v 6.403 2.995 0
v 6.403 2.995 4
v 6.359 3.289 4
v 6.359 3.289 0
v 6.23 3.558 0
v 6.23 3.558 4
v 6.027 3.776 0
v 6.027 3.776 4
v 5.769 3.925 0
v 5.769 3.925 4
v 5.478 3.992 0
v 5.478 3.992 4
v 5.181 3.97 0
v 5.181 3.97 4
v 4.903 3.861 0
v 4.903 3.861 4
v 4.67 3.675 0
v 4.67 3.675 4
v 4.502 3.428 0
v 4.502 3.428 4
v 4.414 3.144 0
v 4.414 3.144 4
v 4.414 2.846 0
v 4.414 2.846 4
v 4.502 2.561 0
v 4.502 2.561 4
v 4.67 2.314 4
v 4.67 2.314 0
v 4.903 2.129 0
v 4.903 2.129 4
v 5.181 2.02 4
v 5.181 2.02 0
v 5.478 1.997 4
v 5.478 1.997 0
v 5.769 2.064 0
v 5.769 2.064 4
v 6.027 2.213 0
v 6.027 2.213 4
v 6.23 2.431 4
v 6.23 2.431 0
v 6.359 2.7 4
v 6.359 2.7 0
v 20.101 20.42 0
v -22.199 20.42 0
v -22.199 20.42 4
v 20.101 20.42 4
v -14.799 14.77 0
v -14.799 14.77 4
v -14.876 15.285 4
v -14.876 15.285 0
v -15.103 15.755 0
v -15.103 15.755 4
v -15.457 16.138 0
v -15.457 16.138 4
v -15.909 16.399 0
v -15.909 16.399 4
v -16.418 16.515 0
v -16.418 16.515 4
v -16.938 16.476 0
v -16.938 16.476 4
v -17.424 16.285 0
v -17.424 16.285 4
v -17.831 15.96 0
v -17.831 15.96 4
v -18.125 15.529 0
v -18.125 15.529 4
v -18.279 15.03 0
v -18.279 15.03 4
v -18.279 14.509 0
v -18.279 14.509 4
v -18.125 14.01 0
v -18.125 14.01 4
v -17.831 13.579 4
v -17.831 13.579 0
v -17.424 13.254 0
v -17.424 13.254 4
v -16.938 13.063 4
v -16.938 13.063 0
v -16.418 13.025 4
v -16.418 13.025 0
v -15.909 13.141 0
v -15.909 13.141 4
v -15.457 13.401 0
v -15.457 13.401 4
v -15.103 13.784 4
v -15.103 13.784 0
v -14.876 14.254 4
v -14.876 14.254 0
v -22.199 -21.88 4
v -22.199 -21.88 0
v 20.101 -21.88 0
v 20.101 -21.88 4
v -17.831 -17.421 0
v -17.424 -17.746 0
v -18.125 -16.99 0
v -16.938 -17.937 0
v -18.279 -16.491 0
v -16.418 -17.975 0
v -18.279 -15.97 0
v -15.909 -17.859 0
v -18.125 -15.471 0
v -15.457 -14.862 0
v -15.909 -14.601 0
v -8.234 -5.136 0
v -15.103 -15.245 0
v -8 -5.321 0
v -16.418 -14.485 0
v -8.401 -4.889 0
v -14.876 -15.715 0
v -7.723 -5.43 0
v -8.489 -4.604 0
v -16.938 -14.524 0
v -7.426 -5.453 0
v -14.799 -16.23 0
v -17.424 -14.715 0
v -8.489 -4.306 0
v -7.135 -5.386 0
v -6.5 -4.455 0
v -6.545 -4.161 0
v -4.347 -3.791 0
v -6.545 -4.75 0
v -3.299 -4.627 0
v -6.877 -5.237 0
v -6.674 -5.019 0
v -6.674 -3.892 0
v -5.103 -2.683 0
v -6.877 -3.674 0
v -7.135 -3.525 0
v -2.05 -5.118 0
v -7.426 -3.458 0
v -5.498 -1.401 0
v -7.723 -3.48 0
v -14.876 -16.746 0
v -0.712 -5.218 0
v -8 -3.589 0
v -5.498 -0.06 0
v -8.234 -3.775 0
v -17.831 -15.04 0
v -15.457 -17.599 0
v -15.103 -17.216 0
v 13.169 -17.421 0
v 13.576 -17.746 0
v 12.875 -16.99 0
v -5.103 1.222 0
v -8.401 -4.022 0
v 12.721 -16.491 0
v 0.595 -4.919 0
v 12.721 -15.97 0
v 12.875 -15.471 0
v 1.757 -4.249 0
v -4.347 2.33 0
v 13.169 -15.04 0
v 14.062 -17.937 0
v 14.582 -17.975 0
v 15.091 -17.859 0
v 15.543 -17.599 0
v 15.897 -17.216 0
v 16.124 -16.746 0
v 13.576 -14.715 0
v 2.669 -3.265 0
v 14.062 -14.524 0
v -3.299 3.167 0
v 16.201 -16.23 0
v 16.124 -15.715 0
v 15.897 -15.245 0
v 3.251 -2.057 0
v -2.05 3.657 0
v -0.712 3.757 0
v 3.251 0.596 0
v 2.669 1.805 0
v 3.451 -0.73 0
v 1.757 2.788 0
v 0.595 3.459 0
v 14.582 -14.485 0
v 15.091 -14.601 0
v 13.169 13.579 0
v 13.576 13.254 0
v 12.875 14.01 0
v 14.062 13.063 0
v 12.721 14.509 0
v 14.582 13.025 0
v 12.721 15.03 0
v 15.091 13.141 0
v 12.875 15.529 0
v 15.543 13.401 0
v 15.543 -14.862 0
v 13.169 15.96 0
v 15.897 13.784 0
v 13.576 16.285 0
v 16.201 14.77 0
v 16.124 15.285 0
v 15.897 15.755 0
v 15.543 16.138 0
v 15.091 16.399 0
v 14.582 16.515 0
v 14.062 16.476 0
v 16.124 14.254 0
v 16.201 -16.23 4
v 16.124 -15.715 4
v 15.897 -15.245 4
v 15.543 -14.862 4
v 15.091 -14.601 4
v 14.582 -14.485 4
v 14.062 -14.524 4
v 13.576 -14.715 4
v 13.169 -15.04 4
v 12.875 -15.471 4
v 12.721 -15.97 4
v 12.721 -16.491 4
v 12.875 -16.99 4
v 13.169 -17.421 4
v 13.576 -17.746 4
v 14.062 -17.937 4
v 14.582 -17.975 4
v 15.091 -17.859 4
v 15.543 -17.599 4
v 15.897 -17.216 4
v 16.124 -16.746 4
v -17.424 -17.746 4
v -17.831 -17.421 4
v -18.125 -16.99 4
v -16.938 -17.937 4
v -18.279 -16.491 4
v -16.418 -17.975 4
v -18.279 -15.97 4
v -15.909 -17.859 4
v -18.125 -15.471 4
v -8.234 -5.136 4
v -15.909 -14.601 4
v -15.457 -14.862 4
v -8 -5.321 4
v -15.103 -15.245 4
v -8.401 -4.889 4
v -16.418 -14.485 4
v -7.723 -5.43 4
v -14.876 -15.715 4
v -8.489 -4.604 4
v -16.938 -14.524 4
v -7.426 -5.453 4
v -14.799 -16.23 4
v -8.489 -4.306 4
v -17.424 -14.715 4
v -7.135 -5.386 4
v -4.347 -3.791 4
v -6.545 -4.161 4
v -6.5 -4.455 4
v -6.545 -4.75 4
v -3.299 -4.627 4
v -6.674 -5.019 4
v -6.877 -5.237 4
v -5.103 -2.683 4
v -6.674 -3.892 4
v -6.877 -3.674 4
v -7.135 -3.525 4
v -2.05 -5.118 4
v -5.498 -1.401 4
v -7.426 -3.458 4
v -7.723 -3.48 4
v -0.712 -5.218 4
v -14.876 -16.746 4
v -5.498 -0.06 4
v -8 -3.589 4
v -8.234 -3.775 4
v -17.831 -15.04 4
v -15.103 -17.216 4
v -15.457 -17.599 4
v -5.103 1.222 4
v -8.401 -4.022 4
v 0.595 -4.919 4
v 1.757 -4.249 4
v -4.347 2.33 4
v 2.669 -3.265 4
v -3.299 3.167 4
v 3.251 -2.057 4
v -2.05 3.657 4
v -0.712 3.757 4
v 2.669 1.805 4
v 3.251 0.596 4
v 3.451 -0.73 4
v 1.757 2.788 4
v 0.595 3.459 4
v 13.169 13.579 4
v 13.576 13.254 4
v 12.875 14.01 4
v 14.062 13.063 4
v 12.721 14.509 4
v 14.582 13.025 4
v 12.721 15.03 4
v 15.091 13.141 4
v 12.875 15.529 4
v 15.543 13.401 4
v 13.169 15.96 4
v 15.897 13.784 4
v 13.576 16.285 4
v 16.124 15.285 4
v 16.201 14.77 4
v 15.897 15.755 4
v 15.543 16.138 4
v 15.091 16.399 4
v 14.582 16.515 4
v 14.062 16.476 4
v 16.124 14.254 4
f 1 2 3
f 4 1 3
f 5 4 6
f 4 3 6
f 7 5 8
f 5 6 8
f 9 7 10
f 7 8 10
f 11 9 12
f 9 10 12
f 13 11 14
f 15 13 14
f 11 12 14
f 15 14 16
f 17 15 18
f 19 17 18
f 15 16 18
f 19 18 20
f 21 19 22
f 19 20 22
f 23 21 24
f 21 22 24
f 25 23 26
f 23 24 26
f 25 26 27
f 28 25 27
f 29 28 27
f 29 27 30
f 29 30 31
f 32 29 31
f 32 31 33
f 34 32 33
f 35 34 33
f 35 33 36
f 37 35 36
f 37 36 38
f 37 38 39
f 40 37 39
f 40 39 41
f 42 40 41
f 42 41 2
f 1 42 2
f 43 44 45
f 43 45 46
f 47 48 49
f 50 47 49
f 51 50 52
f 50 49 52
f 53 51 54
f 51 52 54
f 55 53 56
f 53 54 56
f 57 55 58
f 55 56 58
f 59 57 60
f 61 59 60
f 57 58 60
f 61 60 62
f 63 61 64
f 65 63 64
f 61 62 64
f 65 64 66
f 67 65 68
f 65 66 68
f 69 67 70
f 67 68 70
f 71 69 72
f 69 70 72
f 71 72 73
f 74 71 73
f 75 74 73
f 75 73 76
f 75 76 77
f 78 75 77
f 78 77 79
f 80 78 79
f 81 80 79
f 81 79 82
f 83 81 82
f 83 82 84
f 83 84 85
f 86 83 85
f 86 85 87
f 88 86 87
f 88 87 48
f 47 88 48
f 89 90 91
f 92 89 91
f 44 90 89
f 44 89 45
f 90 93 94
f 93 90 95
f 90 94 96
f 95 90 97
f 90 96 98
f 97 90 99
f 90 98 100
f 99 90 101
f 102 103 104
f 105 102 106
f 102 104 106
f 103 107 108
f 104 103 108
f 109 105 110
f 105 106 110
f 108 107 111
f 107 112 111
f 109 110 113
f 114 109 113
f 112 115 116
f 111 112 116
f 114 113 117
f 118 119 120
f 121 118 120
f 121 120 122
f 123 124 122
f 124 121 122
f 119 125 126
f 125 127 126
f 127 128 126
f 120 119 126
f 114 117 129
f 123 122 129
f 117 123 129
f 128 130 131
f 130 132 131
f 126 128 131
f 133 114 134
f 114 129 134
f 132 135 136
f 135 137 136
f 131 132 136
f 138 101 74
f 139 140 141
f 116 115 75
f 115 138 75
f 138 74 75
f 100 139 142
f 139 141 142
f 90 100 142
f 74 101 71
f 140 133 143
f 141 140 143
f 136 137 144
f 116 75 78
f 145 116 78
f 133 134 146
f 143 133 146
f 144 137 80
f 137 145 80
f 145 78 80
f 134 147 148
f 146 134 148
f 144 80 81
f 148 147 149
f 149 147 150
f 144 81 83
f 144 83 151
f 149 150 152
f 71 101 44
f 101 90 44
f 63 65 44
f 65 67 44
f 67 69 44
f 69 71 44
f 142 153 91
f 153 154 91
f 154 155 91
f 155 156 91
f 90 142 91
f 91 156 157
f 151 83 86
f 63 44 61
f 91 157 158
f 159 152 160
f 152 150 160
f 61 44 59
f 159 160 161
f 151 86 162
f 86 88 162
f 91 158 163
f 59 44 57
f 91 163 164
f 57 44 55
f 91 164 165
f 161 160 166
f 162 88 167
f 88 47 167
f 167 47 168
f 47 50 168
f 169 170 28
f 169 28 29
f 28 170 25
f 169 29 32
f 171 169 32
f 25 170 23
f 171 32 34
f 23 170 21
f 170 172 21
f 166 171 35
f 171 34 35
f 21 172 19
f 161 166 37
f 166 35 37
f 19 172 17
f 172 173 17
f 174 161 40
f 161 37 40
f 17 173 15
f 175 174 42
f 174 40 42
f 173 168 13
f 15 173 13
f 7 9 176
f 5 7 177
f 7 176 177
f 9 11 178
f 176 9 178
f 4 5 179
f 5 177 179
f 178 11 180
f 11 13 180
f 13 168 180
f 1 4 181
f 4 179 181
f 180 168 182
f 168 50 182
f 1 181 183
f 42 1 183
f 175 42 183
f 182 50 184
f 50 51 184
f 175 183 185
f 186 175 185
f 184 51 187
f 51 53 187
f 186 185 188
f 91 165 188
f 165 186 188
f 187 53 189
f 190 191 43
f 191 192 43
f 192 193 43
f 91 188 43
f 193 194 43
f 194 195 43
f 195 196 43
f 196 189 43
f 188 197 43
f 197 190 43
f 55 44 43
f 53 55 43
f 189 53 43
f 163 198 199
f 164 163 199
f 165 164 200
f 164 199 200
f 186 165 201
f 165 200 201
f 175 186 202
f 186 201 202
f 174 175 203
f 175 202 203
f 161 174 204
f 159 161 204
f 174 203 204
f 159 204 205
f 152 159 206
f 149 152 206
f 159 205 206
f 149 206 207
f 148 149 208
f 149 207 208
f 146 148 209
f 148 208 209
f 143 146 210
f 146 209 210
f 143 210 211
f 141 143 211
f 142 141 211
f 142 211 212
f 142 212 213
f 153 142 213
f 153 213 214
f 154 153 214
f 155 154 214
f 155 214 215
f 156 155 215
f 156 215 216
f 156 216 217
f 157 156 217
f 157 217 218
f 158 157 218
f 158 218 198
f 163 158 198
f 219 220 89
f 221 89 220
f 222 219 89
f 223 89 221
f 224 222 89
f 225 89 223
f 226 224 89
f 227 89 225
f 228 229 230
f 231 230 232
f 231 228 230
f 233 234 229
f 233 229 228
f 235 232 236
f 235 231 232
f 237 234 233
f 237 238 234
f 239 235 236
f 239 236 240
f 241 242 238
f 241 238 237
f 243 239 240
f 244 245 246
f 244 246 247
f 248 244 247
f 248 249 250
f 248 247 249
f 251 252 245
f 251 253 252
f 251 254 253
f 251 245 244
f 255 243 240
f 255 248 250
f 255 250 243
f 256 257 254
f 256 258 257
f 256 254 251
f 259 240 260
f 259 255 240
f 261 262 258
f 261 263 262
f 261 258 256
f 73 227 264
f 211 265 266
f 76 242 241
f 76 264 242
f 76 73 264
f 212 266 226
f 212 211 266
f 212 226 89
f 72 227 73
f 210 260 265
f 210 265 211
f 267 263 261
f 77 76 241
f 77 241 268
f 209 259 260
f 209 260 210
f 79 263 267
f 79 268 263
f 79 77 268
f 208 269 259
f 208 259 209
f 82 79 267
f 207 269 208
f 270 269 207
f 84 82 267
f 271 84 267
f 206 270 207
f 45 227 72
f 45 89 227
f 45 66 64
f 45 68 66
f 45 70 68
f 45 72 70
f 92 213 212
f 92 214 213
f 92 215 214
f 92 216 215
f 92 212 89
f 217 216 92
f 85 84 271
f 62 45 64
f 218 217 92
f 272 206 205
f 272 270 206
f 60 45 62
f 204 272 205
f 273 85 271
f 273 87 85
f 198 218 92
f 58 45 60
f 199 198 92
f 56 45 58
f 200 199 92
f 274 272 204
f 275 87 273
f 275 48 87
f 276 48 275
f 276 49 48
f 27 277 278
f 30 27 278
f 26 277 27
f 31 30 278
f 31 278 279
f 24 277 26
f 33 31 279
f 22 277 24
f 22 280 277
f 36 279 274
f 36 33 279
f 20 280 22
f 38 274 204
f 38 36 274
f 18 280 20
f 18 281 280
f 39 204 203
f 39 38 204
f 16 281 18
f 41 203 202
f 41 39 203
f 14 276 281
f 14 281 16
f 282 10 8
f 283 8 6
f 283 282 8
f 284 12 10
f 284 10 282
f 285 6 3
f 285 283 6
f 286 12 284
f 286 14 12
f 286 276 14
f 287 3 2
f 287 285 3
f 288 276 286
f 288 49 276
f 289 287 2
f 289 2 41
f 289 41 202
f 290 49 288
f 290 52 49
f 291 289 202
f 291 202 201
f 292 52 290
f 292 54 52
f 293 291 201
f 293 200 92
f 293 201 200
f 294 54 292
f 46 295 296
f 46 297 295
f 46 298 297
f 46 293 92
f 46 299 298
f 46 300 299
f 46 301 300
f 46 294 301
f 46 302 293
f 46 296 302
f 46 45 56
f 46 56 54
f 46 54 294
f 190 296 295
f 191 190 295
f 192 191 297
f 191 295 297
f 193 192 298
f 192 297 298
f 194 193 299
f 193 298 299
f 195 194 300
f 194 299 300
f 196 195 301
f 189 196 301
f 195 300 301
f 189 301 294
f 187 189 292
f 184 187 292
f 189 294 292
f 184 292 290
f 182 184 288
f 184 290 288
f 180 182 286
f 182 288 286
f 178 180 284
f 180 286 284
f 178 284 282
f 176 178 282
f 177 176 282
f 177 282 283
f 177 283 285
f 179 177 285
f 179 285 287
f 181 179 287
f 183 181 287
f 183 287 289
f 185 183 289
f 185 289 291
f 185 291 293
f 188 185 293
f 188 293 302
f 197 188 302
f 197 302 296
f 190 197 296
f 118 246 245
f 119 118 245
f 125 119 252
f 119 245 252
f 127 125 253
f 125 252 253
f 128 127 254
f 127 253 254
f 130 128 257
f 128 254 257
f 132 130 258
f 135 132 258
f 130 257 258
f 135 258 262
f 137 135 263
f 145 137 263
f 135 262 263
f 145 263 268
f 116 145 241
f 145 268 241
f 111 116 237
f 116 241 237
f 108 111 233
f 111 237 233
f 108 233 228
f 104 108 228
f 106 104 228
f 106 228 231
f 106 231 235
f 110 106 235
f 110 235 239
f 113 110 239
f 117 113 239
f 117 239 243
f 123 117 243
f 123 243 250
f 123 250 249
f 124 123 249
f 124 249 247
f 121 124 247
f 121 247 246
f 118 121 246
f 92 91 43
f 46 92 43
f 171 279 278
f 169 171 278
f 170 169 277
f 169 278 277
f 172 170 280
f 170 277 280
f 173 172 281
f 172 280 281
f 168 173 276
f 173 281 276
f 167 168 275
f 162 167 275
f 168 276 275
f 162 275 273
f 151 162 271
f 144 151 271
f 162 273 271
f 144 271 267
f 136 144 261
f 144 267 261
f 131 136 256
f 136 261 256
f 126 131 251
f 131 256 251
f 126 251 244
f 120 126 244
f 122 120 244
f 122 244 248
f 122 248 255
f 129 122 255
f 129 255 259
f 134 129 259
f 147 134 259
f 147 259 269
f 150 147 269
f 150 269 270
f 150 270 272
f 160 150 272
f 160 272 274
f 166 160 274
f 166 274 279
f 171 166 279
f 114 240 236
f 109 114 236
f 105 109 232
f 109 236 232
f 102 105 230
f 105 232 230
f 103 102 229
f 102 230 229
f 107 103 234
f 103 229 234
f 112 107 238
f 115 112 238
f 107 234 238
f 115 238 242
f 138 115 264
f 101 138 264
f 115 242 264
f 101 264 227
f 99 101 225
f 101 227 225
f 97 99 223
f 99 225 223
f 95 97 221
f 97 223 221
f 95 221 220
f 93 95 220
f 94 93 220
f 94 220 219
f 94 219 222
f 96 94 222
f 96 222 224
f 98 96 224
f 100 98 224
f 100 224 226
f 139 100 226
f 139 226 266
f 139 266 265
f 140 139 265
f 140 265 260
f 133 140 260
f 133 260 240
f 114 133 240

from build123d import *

# Parameters (mm, degrees)
F0_W     = 42.3
F0_H     = 42.3
F1_DEPTH = 4
F2_R     = 1.75
F2_R_2   = 4.5
F2_R_3   = 1
F3_DEPTH = 25


with BuildPart() as f1:
    # F0 (on Top) → F1 (new body)
    with BuildSketch(Plane.XY):
        with Locations((-1.048587, -0.730384)):
            Rectangle(F0_W, F0_H)
    extrude(amount=F1_DEPTH)

    # F2 (on face) → F3 (cut)
    with BuildSketch(Plane.XY.offset(4)):
        with Locations((-16.548587, -16.230384)):
            Circle(F2_R)
        with Locations((14.451413, -16.230384)):
            Circle(F2_R)
        with Locations((14.451413, 14.769616)):
            Circle(F2_R)
        with Locations((-16.548587, 14.769616)):
            Circle(F2_R)
        with Locations((-1.048587, -0.730384)):
            Circle(F2_R_2)
        with Locations((-7.500477, -4.455384)):
            Circle(F2_R_3)
        with Locations((5.403302, 2.994616)):
            Circle(F2_R_3)
    extrude(amount=-F3_DEPTH, mode=Mode.SUBTRACT)


solid = f1.part
